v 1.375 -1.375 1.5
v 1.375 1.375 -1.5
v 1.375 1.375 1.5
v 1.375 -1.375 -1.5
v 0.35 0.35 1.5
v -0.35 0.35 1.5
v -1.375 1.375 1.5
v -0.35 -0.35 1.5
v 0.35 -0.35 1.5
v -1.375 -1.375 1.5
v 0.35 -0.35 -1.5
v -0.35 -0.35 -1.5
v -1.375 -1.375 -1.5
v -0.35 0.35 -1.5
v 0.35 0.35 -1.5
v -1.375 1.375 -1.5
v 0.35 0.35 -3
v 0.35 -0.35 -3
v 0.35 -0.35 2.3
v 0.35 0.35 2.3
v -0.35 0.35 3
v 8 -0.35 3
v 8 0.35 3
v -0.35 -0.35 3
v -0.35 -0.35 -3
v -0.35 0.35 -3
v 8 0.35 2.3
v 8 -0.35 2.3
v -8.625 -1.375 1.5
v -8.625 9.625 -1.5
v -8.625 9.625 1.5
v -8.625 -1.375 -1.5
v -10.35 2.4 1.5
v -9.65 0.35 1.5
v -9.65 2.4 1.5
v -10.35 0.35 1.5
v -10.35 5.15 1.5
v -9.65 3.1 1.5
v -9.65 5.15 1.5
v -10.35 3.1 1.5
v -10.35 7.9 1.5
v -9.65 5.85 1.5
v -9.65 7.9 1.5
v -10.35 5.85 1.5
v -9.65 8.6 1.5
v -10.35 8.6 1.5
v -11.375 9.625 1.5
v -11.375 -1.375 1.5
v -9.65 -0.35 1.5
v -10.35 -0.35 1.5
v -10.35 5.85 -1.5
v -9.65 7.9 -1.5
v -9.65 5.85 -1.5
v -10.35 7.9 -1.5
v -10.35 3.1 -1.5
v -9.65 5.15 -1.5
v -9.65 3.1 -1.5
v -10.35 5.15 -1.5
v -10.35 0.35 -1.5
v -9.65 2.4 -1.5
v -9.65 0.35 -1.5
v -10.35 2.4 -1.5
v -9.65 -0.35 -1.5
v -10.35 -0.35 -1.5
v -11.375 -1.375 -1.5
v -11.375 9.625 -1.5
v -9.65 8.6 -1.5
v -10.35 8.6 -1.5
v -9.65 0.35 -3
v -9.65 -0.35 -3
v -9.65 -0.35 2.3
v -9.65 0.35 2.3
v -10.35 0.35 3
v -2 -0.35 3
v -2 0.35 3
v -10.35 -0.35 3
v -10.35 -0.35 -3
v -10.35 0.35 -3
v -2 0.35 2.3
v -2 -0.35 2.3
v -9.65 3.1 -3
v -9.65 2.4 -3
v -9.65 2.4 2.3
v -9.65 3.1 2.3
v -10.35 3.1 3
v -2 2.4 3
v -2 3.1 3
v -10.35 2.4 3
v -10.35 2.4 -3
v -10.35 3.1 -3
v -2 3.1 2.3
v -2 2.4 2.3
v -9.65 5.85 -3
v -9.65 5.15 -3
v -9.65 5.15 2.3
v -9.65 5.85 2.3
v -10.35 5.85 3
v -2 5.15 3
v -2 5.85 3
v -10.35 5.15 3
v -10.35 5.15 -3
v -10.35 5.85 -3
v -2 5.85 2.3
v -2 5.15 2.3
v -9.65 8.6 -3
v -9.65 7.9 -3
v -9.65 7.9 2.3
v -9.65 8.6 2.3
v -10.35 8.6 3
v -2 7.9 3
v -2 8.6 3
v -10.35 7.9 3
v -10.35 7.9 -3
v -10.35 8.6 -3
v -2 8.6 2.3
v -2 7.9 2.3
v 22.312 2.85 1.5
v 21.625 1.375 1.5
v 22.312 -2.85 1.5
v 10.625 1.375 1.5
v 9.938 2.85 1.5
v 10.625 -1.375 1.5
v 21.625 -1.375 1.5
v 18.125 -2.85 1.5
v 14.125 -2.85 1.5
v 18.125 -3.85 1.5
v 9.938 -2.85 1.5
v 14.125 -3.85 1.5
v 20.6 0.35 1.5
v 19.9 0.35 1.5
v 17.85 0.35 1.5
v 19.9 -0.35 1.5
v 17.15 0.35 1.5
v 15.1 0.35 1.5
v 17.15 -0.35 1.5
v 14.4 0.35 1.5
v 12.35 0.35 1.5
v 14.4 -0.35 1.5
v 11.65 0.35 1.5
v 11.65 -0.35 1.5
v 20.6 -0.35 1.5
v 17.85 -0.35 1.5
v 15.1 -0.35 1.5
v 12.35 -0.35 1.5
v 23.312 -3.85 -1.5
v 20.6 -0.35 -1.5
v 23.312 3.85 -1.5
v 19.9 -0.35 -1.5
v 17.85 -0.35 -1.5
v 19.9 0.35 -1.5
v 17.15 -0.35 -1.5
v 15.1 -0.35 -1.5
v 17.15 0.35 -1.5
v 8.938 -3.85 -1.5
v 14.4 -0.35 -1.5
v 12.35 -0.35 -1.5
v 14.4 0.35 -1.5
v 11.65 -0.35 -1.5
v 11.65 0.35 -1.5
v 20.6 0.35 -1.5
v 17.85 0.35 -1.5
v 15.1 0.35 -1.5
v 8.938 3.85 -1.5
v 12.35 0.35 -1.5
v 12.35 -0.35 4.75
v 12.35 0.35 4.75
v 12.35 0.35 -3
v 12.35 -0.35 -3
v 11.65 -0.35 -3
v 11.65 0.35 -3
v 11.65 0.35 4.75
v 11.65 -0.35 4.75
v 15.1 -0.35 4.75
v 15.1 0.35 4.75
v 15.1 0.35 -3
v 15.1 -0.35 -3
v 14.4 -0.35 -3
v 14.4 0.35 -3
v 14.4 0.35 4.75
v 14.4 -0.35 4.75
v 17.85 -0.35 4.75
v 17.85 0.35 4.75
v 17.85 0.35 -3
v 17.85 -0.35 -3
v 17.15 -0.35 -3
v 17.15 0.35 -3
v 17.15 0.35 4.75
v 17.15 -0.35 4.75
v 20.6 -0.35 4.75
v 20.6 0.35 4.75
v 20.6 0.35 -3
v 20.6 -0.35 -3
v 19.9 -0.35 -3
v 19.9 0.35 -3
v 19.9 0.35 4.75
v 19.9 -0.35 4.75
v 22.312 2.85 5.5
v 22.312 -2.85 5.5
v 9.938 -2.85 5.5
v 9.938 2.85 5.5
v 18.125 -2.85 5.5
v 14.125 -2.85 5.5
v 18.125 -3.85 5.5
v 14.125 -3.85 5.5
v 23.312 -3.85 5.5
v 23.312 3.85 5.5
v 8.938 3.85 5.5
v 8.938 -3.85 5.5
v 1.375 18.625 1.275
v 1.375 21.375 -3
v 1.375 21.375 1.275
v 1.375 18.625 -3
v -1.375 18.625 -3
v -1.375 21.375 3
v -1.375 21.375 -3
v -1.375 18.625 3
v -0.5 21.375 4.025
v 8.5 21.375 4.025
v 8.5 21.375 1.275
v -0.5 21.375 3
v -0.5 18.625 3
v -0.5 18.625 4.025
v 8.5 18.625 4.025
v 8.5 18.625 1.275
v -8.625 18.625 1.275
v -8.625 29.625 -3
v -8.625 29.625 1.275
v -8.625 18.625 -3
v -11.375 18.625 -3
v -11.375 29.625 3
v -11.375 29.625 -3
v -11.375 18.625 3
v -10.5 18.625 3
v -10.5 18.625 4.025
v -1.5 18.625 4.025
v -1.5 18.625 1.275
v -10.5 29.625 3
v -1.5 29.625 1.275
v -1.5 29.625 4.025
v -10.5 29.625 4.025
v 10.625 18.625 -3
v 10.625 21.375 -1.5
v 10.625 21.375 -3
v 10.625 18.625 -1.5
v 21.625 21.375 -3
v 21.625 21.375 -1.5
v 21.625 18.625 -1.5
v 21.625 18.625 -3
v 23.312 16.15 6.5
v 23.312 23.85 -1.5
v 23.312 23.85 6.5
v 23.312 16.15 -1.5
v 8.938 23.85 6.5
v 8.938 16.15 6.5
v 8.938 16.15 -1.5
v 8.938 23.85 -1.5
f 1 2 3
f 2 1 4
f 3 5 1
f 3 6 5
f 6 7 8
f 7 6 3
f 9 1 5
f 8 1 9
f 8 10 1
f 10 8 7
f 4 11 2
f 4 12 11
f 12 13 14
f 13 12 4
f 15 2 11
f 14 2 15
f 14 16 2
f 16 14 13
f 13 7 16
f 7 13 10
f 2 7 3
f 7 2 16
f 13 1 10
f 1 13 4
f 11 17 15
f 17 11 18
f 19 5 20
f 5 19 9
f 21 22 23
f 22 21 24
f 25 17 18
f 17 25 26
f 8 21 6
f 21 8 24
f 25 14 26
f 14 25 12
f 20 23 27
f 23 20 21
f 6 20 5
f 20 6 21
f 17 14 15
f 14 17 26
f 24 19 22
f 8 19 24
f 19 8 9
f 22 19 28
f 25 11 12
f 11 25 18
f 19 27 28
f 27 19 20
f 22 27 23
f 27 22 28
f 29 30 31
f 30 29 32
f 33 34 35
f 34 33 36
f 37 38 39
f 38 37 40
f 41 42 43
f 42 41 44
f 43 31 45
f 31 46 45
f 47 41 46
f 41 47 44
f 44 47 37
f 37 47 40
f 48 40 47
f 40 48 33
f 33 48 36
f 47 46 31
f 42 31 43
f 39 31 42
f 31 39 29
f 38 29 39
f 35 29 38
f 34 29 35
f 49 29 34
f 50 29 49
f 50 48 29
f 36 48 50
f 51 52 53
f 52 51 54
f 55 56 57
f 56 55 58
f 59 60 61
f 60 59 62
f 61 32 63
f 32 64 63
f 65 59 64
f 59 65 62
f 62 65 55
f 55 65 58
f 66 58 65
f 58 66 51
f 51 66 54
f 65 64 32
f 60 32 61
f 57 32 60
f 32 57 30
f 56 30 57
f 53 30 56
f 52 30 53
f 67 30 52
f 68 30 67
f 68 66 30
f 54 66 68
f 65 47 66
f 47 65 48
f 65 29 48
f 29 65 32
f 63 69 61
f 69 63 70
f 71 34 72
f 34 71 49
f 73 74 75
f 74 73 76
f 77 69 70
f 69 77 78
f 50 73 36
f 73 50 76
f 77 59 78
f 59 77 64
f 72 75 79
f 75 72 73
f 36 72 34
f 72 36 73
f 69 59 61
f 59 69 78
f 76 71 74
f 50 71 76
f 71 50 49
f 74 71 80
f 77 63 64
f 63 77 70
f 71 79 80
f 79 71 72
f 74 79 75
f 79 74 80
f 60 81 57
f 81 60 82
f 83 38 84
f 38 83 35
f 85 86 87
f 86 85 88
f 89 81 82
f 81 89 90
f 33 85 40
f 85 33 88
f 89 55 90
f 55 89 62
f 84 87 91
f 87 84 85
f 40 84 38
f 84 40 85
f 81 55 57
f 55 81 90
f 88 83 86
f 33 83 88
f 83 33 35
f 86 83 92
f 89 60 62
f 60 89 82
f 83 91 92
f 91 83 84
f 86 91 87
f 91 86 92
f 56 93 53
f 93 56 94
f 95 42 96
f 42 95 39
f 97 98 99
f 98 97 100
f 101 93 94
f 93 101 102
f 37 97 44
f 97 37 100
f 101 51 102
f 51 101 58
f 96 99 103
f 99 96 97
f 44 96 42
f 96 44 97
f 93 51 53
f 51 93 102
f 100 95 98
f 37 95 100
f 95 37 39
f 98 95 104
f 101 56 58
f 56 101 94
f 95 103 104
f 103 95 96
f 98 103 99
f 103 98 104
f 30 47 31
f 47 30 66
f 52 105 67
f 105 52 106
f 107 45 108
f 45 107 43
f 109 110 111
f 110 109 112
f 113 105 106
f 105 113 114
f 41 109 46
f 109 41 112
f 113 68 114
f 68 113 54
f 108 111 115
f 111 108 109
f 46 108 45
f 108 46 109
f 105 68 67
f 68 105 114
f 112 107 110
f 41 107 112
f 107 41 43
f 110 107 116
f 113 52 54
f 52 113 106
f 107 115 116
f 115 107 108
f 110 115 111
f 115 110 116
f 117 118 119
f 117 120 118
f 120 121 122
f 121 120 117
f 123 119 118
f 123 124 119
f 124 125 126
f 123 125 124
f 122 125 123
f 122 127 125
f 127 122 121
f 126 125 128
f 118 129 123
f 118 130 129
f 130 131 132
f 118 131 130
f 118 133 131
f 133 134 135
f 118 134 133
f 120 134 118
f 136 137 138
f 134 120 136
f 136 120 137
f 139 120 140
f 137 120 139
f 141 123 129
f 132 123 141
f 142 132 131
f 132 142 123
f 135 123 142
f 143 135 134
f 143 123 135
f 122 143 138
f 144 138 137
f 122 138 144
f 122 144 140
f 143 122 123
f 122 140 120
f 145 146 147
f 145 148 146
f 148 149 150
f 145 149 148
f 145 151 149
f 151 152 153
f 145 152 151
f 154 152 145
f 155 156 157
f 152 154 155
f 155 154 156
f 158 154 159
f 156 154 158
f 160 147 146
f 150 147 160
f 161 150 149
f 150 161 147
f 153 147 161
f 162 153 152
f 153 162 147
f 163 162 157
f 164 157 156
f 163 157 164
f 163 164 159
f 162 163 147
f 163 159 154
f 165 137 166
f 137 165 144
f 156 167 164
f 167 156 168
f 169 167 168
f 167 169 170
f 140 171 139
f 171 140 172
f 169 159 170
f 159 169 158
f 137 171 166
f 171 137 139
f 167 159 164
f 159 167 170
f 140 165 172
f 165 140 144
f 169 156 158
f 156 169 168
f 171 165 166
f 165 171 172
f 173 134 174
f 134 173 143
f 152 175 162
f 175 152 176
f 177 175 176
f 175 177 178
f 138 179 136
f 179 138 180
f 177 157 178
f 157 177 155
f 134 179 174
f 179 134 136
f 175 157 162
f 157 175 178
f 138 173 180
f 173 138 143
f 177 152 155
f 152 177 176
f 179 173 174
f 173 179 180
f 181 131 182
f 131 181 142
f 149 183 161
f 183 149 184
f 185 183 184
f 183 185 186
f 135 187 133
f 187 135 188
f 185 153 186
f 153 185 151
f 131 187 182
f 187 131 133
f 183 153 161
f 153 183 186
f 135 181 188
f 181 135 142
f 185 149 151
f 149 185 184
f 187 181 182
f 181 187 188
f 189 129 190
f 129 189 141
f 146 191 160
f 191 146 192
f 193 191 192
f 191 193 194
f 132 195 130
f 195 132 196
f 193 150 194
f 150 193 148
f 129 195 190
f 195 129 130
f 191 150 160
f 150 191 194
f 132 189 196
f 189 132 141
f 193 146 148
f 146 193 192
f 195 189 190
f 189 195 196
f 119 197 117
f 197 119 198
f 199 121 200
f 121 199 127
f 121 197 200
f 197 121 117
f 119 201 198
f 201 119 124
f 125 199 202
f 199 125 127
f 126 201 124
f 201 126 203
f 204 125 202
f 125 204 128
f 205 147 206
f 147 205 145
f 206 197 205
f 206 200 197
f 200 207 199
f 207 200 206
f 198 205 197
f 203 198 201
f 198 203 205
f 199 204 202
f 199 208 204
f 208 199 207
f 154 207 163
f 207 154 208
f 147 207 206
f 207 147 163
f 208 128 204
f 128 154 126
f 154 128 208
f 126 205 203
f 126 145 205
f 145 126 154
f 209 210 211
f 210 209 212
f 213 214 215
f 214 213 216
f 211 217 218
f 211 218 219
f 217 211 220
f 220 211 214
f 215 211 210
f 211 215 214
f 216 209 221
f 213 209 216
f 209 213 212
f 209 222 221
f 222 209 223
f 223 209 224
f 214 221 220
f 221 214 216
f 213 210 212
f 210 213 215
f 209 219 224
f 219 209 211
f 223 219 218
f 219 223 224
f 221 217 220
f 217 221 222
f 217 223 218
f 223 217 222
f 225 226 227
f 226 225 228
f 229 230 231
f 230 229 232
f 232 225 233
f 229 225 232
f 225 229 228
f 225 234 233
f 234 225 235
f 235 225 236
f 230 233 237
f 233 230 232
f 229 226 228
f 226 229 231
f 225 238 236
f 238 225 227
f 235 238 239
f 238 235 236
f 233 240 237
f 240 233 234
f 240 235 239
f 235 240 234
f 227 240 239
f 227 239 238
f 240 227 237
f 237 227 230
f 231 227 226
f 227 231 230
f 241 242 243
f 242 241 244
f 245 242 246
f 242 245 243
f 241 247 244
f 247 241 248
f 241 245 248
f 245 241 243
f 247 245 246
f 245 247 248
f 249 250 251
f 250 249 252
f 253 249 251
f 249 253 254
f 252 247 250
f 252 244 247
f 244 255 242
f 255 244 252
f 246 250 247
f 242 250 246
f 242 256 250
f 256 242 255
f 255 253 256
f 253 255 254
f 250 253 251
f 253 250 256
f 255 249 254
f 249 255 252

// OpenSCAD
pin(len = 8, angle = 90, mask = 0);
translate([-10,0,0])pinrow(num = 4,len = 8, angle = 90, mask = 0);

translate([12,0,0])xh2_54f(num = 4, mask = 0);
translate([0,20,0])
{
pin(len = 8, angle = 90, mask = 1);
translate([-10,0,0])pinrow(num = 4,len = 8, angle = 90, mask = 1);

translate([12,0,0])xh2_54f(num = 4, mask = 1);
}
module pin(len = 7, angle = 0, mask = 0)
{
  pins = (mask == 0)? 0.70: 2.75;
  cube([2.75,2.75,3], center = true); //plastic cube
  cube([pins,pins,6], center = true); //transverse
  translate([(angle != 0)?len/2*sin(angle):0,0,(angle != 0)?len/2*cos(angle)-0.35+3:3])
    rotate([0,angle,0])
    cube([pins,pins,len+mask], center = true); //transverse

}

module pinrow(num = 4,len = 7, angle = 0, mask = 0)
{
  for(y =  [0:num-1])
    translate([0,y*2.75,0])pin(len,angle, mask = mask);
}
module xh2_54f(num = 4, mask = 0)
{
  for(x =  [0:num-1])
    translate([x*2.75,0,0])pin(len = 3.5, mask = mask);
  translate([num*2.75/2-2.75/2,0,2+mask/2])
  {
    difference()
    {
      cube([(num+0.5)*2.75+2, 5.7+2,7+mask], center = true);
      if(mask == 0)
      union()
      {
        translate([0,0,3])
          cube([(num+0.5)*2.75, 5.7,7], center = true);
        translate([0,-2,3])
          cube([4, 5.7,7], center = true);
      }
    }
  }
}
